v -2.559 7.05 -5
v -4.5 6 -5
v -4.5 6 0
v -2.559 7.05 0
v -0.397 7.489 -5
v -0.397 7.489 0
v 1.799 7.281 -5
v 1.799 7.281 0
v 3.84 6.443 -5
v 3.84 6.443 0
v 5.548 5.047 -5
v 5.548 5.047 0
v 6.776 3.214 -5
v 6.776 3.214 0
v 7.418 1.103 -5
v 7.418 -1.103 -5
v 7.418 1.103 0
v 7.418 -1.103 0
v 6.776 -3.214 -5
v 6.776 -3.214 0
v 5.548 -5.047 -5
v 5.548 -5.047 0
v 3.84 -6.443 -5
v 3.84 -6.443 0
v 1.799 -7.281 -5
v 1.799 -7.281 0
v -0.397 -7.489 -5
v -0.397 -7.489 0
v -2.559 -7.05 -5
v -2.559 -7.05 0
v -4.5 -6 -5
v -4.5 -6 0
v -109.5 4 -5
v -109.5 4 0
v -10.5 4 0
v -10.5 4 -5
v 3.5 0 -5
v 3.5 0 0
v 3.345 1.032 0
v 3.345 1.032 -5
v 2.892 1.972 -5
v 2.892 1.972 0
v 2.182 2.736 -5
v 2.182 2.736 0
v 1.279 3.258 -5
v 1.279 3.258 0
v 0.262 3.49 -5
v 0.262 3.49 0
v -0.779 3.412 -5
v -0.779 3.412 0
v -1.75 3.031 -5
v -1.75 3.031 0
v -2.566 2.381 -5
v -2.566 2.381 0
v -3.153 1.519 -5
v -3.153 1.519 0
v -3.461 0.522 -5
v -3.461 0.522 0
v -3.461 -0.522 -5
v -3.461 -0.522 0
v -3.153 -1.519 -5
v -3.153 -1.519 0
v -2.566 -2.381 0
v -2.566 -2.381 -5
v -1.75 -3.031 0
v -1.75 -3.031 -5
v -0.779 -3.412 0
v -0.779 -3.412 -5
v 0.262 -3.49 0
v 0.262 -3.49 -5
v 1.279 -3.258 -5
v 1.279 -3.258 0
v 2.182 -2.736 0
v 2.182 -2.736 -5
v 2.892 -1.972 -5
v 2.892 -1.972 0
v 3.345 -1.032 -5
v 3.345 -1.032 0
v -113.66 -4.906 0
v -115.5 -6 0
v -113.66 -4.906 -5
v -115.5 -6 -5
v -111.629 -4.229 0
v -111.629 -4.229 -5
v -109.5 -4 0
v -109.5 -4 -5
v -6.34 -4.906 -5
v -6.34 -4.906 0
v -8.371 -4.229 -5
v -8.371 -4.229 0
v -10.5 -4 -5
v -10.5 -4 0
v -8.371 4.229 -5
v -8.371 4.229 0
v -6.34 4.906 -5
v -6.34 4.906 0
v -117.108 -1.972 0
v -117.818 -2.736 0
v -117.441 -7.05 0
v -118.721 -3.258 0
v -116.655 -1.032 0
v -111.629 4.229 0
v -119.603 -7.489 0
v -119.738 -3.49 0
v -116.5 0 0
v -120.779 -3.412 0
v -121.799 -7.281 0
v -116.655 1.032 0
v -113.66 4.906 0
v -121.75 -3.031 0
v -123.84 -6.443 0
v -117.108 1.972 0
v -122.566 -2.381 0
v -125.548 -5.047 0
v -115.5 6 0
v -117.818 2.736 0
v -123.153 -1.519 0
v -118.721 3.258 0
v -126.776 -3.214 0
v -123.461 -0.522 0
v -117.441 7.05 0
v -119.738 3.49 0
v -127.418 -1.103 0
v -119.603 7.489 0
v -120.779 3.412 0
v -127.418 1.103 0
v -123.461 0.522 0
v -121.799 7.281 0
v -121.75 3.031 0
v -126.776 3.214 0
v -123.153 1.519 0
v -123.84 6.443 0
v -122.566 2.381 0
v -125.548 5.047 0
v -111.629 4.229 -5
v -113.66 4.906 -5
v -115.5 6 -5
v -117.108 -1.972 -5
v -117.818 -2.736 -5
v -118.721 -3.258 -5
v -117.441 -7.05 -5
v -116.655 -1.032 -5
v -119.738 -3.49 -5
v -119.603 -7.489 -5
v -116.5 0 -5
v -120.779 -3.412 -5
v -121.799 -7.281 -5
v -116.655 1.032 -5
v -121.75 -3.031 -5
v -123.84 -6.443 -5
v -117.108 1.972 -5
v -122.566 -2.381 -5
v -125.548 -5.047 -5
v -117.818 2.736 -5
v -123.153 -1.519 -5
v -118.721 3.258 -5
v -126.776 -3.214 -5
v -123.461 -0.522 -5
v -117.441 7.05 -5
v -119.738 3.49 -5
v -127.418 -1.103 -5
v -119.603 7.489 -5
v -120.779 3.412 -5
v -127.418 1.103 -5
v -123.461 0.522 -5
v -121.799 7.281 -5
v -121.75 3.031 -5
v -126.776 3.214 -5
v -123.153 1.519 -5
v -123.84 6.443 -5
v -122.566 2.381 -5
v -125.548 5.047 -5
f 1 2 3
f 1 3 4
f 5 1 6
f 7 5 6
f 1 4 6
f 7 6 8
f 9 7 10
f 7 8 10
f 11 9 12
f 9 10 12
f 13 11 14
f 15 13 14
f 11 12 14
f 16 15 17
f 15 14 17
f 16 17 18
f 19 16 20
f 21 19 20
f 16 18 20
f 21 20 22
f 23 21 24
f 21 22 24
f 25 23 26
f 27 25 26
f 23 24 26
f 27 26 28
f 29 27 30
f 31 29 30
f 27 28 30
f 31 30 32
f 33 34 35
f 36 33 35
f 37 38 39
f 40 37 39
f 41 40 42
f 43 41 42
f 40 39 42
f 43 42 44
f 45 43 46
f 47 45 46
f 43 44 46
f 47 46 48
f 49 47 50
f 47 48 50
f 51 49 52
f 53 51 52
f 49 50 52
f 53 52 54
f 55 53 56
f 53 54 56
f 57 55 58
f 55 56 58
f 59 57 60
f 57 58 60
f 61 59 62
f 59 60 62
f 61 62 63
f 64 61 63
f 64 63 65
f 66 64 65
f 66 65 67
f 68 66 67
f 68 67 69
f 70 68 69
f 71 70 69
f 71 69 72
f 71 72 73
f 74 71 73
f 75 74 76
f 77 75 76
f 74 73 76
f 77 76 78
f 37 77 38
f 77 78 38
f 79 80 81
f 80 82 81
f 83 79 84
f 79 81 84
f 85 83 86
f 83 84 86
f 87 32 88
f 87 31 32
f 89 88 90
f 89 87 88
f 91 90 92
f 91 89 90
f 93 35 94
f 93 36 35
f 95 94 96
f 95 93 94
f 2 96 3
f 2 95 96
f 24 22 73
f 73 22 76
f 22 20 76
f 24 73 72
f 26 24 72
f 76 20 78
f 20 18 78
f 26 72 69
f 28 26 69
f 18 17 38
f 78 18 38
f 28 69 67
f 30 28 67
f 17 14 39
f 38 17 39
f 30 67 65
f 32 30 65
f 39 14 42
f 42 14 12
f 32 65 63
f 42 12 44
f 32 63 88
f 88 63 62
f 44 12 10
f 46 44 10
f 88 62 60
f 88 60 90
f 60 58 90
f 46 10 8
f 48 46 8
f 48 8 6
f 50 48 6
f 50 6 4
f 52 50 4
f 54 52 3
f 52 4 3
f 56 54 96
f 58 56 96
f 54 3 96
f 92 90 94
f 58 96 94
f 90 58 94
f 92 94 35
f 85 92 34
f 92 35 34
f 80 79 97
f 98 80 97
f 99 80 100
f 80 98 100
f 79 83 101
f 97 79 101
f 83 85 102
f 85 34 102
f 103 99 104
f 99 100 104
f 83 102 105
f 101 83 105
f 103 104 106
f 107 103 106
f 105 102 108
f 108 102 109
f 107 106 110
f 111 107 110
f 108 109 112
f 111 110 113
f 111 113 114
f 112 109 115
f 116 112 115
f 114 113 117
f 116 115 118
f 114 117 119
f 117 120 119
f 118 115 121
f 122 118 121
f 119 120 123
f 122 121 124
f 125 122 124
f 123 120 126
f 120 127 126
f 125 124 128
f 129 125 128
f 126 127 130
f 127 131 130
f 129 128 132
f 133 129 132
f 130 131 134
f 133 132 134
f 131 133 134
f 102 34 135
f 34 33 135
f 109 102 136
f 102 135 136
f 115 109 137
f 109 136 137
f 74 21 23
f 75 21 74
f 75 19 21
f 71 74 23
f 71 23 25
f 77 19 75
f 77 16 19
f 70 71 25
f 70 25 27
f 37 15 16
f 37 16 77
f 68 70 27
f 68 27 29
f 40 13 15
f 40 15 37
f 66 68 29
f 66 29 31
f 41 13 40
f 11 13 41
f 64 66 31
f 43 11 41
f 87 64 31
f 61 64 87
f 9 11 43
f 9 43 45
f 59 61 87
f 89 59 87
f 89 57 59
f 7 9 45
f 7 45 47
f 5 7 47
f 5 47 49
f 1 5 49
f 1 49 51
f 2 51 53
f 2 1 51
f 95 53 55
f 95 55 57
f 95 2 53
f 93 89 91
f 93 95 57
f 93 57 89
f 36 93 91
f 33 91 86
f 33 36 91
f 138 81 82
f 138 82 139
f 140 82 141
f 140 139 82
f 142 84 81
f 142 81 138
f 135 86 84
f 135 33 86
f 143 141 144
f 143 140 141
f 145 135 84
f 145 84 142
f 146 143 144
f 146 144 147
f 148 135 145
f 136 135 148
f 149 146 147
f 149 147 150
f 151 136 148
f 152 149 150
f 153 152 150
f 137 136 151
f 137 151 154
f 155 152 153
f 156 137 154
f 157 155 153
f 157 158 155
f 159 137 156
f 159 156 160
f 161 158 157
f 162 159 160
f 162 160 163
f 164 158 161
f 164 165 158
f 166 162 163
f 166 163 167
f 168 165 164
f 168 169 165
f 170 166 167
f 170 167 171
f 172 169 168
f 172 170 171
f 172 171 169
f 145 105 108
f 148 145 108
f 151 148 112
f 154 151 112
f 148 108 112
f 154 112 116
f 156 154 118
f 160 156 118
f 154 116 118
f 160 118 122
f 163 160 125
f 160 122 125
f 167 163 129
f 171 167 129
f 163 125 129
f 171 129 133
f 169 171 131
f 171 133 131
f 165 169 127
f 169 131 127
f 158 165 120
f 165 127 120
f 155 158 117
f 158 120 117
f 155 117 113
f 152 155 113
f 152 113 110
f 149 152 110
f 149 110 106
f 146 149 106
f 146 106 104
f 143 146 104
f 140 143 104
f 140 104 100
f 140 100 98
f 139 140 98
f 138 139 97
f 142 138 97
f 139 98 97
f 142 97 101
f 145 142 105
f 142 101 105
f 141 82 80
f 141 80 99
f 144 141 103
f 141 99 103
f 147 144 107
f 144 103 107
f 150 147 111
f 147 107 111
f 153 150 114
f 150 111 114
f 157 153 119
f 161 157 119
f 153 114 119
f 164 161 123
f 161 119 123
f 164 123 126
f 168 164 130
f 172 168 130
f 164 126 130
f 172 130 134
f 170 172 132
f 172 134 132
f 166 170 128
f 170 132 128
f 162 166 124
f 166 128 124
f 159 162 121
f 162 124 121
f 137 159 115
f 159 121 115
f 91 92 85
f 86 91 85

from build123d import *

# Parameters (mm, degrees)
SKETCH1_R          = 3.5
BASE_FLANGE1_DEPTH = 5
FILLET1_R          = 10


# Sheet-metal steps are written as plain solids
with BuildPart() as part:
    # Sketch1 → Base-Flange1 (new body)
    with BuildSketch(Plane.XY):
        with BuildLine():
            Line((-113.65571123, 4), (-6.34428877, 4))
            ThreePointArc((-6.34428877, 4), (7.5, 0), (-6.34428877, -4))
            Line((-6.34428877, -4), (-113.65571123, -4))
            ThreePointArc((-113.65571123, -4), (-127.5, 0), (-113.65571123, 4))
        make_face()
        with Locations((-120, 0)):
            Circle(SKETCH1_R, mode=Mode.SUBTRACT)
        Circle(SKETCH1_R, mode=Mode.SUBTRACT)
    extrude(amount=-BASE_FLANGE1_DEPTH)

    # Fillet1
    fillet1_edges = [part.edges().sort_by_distance(p)[0] for p in [
        (-113.65571123, 4, -2.5),
        (-6.34428877, 4, -2.5),
        (-6.34428877, -4, -2.5),
        (-113.65571123, -4, -2.5),
    ]]
    fillet(fillet1_edges, radius=FILLET1_R)


solid = part.part
